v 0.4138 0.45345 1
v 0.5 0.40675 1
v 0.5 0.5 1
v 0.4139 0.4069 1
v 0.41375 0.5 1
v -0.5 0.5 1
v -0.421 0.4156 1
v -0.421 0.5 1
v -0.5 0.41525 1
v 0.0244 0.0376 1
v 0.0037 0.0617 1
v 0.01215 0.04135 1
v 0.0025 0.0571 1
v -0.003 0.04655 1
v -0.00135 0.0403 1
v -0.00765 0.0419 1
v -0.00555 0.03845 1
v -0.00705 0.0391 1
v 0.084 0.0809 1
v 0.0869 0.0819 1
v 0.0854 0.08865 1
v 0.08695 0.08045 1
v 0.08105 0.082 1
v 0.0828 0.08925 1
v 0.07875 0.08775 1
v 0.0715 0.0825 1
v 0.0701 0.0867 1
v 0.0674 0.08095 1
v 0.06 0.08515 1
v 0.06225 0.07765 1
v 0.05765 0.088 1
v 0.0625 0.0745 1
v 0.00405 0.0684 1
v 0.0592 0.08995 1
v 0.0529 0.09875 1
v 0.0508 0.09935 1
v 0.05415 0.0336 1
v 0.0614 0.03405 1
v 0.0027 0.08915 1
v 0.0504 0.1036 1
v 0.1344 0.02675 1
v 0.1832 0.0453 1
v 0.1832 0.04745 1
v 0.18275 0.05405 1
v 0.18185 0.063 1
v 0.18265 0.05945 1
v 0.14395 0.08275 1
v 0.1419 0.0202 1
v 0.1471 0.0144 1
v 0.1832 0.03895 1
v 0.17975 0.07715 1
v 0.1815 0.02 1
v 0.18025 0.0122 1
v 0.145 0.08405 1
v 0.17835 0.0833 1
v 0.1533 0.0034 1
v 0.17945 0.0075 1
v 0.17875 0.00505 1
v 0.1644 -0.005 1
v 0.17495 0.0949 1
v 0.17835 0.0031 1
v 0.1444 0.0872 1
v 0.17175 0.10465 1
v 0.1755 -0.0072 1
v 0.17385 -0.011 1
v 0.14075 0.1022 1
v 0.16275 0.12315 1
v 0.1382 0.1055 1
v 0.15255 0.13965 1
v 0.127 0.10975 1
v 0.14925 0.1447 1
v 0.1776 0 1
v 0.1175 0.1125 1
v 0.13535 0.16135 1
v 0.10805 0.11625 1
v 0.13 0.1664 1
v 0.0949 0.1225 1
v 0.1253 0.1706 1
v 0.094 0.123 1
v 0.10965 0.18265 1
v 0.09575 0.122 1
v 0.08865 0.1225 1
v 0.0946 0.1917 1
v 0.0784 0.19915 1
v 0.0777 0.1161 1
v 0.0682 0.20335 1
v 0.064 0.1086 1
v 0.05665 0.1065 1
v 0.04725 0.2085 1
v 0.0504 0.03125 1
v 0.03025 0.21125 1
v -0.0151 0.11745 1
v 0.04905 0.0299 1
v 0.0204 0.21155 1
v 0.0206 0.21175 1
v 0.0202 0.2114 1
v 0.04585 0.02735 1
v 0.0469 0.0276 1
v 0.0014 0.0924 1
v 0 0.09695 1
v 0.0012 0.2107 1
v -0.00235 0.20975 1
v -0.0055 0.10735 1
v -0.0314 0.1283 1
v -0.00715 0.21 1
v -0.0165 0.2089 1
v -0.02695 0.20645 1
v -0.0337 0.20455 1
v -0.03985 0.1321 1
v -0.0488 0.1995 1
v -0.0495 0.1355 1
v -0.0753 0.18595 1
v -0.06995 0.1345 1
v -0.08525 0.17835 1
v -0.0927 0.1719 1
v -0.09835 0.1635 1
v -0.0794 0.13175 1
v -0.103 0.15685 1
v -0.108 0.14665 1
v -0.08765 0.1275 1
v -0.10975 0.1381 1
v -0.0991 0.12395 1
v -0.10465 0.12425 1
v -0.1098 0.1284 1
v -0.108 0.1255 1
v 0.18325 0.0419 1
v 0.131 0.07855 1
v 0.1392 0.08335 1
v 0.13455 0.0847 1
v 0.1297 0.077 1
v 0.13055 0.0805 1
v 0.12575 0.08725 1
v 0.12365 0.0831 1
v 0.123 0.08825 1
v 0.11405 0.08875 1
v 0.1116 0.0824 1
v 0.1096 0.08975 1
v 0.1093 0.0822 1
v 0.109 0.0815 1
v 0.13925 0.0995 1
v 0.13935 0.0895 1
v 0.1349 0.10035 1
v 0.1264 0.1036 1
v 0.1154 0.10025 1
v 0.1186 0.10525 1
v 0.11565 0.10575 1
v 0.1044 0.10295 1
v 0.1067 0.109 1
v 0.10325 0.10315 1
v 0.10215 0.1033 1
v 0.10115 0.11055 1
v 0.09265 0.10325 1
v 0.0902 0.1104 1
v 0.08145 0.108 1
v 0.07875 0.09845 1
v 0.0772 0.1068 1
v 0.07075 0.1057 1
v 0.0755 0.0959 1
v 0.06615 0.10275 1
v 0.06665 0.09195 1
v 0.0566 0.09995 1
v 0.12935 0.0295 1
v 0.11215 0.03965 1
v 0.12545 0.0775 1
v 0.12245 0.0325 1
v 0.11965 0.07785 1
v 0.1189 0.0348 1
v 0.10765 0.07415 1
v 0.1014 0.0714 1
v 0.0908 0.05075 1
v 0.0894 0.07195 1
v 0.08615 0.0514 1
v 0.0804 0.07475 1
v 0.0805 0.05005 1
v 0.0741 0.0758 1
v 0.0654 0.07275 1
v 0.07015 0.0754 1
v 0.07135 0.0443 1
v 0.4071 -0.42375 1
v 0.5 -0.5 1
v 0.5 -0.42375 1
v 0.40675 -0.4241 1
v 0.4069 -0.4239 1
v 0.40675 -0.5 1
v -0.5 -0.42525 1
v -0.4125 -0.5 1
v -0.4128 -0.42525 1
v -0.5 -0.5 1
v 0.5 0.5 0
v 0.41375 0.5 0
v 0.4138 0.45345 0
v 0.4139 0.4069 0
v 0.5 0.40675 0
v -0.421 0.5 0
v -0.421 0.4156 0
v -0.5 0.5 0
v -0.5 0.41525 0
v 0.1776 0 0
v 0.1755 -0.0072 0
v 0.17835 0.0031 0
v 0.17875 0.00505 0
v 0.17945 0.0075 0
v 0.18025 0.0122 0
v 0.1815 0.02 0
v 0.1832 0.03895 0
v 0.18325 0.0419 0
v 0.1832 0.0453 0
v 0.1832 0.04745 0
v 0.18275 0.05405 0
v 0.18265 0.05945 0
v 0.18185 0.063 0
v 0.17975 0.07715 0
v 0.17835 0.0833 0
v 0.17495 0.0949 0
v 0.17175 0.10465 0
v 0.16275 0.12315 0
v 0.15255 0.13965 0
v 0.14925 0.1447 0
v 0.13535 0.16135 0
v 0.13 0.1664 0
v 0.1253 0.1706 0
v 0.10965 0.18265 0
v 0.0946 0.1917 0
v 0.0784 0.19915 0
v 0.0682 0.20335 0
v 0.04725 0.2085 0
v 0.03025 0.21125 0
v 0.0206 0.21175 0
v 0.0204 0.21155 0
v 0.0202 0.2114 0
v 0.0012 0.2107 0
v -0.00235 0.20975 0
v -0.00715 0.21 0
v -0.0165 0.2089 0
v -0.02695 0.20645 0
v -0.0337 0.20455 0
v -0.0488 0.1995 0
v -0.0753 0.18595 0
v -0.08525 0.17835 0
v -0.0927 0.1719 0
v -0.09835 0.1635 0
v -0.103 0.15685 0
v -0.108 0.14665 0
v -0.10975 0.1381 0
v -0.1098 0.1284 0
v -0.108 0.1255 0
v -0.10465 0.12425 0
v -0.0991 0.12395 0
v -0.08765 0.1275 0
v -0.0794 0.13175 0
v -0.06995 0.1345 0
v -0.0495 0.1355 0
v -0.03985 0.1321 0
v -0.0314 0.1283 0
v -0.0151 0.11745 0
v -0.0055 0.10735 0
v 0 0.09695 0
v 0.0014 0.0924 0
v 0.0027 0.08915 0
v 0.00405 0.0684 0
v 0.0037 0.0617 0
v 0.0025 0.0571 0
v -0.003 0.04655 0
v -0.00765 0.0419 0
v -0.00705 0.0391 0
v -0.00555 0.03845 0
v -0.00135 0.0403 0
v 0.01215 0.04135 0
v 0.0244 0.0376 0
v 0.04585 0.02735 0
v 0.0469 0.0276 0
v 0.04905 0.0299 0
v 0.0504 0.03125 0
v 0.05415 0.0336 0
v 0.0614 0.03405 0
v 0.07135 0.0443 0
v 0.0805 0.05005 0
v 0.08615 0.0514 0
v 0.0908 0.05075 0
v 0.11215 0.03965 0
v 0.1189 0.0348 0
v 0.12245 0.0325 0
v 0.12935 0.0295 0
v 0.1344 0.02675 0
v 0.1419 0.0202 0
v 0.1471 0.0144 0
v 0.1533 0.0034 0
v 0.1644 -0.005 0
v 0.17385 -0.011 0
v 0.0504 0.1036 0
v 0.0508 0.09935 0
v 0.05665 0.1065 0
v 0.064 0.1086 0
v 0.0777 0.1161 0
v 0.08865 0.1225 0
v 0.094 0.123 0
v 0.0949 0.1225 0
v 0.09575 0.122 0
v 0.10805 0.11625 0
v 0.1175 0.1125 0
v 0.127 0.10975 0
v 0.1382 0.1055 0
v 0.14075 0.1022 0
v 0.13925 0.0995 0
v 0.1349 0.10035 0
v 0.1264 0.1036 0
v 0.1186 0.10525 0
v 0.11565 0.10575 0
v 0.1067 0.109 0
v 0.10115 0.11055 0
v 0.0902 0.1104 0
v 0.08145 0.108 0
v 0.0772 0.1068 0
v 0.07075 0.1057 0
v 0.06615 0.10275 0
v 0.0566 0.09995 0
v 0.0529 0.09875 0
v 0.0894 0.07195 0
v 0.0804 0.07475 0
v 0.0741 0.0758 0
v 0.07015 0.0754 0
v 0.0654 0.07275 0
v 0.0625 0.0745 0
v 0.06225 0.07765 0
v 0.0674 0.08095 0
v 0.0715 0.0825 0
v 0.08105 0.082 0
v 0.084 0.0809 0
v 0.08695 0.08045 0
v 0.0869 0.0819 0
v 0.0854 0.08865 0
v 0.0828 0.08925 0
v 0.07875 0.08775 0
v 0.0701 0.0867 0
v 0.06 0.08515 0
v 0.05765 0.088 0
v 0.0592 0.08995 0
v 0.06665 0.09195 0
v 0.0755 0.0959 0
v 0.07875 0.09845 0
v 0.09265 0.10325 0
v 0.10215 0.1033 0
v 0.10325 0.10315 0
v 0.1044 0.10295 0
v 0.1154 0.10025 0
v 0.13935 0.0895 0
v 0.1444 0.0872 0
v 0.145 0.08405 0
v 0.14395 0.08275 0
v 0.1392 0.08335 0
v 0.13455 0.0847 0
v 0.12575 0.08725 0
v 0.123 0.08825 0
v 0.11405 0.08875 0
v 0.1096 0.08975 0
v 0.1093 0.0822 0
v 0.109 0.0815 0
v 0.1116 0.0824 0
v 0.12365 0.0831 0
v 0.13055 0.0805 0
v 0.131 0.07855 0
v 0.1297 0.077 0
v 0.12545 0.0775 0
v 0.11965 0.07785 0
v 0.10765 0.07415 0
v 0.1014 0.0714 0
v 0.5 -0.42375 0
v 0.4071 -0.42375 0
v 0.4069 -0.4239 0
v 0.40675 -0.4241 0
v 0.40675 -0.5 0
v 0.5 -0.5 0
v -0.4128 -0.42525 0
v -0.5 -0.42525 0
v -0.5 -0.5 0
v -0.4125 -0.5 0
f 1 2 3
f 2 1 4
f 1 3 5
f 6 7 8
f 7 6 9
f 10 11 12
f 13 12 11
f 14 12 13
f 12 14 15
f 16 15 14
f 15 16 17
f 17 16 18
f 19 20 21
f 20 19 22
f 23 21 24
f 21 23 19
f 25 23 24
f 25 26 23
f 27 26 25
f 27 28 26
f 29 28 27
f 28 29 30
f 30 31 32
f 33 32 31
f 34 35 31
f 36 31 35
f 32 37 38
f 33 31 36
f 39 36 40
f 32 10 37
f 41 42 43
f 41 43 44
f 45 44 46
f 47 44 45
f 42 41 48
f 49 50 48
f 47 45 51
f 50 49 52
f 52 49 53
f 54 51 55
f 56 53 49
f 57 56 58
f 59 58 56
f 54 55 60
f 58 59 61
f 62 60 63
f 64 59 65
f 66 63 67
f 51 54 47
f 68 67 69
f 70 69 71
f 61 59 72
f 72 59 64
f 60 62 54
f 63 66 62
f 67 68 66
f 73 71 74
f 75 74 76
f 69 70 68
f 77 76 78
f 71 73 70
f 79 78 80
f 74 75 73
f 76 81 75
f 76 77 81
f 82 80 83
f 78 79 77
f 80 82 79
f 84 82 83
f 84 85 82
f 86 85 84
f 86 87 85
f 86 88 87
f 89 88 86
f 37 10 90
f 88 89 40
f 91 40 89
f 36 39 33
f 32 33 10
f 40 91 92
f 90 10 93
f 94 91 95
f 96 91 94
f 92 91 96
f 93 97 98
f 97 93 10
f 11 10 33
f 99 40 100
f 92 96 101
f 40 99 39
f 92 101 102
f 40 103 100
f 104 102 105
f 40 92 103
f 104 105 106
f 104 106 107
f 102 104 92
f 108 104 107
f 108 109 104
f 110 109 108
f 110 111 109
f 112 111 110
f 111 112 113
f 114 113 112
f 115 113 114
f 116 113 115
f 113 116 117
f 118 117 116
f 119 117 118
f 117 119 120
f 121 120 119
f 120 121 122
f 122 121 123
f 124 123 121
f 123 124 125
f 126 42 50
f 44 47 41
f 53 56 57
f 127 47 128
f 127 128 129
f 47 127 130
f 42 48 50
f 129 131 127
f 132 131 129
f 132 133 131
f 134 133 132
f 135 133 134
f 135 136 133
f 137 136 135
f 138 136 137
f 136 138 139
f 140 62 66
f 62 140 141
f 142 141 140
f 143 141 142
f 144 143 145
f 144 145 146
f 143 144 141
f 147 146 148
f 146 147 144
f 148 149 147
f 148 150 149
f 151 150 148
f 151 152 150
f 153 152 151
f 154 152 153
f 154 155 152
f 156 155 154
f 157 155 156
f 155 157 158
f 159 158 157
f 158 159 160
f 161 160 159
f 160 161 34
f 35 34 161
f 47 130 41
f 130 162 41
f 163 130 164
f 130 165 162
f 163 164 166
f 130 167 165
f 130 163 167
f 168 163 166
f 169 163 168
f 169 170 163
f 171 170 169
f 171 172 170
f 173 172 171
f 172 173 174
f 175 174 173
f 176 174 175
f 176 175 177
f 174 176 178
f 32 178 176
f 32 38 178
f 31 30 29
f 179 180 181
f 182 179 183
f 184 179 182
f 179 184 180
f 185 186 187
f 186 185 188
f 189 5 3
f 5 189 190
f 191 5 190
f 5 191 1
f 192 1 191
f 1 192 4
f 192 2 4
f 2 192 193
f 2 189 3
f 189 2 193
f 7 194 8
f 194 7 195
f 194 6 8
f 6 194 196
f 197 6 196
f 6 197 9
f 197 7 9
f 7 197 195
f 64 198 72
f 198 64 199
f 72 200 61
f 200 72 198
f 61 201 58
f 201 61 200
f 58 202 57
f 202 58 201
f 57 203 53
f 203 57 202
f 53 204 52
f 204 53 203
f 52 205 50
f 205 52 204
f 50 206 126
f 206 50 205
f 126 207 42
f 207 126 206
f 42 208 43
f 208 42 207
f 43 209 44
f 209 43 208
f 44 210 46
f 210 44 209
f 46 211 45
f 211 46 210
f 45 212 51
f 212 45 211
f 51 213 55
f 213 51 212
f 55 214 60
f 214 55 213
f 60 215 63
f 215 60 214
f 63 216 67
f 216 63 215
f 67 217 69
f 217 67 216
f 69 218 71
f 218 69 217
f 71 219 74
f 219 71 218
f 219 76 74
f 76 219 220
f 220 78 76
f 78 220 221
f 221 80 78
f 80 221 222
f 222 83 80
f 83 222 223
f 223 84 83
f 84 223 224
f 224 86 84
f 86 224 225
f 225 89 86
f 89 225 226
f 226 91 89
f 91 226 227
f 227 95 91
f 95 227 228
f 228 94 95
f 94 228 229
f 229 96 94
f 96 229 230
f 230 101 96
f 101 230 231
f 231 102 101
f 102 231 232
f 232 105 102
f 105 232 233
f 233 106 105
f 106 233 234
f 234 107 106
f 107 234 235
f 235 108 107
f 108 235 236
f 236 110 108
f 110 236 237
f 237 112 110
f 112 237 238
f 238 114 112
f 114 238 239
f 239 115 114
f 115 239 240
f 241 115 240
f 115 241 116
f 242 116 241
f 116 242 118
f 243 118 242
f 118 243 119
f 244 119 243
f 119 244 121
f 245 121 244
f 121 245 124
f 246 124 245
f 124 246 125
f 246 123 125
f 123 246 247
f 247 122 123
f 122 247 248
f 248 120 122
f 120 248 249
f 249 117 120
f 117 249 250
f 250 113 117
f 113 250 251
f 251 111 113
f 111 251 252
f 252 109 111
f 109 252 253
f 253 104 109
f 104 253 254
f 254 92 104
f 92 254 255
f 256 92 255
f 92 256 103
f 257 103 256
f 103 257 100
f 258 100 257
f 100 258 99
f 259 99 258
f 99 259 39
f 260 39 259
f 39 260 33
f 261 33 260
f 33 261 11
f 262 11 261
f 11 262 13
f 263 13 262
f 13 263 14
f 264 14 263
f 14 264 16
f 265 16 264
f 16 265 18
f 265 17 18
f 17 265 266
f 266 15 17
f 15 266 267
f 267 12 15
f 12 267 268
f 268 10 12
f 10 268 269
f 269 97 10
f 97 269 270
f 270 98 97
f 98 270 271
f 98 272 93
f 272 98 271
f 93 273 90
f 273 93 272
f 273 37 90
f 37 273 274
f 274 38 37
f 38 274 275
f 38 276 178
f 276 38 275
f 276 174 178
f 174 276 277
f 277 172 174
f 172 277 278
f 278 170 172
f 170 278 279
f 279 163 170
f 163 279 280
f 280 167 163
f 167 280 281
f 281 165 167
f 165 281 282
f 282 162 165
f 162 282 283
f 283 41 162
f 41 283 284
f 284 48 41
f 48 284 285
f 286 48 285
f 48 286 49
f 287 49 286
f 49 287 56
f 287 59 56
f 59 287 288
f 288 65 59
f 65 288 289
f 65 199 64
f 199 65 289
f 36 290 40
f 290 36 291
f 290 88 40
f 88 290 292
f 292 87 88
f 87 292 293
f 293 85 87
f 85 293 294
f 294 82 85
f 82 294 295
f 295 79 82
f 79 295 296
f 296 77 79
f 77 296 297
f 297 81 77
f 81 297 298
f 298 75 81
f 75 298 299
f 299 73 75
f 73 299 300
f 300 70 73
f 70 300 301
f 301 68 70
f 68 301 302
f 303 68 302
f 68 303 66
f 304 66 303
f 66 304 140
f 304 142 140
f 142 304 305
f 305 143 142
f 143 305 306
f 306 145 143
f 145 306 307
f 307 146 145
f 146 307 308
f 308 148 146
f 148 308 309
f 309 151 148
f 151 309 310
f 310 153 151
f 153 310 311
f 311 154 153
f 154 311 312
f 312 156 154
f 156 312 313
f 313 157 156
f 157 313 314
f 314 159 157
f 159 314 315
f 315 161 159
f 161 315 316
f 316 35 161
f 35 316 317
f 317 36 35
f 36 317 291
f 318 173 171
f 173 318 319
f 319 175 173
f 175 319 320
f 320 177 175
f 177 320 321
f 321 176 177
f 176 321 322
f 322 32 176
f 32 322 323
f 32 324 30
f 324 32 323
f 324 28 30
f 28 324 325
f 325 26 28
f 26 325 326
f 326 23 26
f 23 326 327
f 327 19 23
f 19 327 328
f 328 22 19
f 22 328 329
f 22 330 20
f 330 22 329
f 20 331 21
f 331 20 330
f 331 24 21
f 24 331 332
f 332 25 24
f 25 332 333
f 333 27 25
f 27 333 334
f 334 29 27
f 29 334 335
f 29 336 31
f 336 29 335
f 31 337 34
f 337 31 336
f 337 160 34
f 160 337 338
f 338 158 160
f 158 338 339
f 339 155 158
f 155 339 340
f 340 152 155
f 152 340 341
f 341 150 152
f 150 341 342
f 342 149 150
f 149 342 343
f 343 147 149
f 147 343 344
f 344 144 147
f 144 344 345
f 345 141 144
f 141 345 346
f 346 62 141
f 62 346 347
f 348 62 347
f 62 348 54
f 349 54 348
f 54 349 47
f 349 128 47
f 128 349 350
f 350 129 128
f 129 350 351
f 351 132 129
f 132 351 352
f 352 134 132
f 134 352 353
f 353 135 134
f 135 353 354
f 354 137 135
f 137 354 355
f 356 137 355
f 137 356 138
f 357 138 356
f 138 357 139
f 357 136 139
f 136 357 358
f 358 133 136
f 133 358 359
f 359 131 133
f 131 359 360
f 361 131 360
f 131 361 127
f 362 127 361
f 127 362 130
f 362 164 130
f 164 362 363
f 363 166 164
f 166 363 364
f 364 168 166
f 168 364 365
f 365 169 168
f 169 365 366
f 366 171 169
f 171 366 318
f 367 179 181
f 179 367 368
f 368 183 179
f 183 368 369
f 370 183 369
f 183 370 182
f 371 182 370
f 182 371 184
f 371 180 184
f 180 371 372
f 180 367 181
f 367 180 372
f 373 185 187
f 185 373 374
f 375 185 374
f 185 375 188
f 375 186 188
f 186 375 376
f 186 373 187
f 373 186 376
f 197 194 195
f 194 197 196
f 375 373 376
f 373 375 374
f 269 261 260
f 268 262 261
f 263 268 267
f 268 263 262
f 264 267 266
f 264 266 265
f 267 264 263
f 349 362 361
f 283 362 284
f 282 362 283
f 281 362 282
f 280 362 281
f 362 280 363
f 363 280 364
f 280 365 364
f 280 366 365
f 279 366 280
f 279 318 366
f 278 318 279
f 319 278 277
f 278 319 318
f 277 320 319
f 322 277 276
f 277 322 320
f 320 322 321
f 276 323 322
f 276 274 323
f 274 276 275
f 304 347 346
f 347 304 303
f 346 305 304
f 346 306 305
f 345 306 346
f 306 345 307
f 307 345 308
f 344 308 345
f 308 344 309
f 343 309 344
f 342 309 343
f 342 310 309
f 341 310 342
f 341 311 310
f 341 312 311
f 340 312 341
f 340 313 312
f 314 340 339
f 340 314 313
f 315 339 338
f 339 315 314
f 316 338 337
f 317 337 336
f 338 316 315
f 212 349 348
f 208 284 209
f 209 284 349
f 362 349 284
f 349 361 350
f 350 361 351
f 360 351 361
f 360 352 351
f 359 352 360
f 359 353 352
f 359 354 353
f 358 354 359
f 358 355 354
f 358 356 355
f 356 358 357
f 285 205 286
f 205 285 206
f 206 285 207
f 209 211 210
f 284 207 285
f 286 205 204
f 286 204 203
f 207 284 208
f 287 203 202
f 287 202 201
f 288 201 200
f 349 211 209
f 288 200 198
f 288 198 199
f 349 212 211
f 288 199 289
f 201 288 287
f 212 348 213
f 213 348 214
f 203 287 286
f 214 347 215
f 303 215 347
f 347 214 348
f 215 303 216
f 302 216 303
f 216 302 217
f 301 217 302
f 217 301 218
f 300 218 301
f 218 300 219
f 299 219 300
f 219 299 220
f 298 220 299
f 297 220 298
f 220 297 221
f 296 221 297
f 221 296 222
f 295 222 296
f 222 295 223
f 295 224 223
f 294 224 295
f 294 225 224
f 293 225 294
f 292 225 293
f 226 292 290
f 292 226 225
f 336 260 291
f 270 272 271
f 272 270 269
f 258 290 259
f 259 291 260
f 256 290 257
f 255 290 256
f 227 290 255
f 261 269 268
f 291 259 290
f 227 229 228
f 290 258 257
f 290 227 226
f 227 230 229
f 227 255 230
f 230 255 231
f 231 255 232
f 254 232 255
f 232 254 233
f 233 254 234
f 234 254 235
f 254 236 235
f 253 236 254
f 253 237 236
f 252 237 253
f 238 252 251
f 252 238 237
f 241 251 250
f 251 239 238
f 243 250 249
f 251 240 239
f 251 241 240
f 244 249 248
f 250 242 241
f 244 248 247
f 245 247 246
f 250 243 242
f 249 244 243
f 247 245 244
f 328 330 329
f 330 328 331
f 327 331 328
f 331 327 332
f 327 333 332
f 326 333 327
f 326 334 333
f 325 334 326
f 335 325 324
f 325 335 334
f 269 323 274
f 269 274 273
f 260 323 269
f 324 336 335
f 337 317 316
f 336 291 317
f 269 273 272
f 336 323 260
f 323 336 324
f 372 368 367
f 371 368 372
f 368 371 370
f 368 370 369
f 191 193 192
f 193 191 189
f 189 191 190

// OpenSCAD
module ms2yellow_1()
{
 /* Generated by trace2scad version 20150415
    http://aggregate.org/MAKE/TRACE2SCAD/
    Optimized model has 190/1359 original points
 */
 color([0.5, 0.5, 0.5])
 assign(minx=0) /* polygon minx=0 */
 assign(miny=0) /* polygon miny=0 */
 assign(maxx=20000) /* polygon maxx=20000 */
 assign(maxy=20000) /* polygon maxy=20000 */
 assign(dx=maxx-minx)
 assign(dy=maxy-miny)
 assign(maxd=((dx>dy)?dx:dy))
 scale([1/maxd, 1/maxd, 1])
 translate([-minx-dx/2, -miny-dy/2, 0])
 linear_extrude(height=1, convexity=190)
 union() {
  union() {
   polygon([[0,19153],[0,18305],[1580,18312],[1580,20000],[0,20000]], convexity=5);
   polygon([[18276,19069],[18278,18138],[20000,18135],[20000,20000],[18275,20000]], convexity=5);
   union() {
    difference() {
     polygon([[10408,14231],[10404,14228],[10024,14214],[9953,14195],[9857,14200],[9670,14178],[9461,14129],[9326,14091],[9024,13990],[8494,13719],[8295,13567],[8146,13438],[8033,13270],[7940,13137],[7840,12933],[7805,12762],[7804,12568],[7840,12510],[7907,12485],[8018,12479],[8247,12550],[8412,12635],[8601,12690],[9010,12710],[9203,12642],[9372,12566],[9698,12349],[9890,12147],[10000,11939],[10028,11848],[10054,11783],[10081,11368],[10074,11234],[10050,11142],[9940,10931],[9847,10838],[9859,10782],[9889,10769],[9973,10806],[10243,10827],[10488,10752],[10917,10547],[10938,10552],[10981,10598],[11008,10625],[11083,10672],[11228,10681],[11427,10886],[11610,11001],[11723,11028],[11816,11015],[12243,10793],[12378,10696],[12449,10650],[12587,10590],[12688,10535],[12838,10404],[12942,10288],[13066,10068],[13288,9900],[13477,9780],[13510,9856],[13552,10000],[13567,10062],[13575,10101],[13589,10150],[13605,10244],[13630,10400],[13664,10779],[13665,10838],[13664,10906],[13664,10949],[13655,11081],[13653,11189],[13637,11260],[13595,11543],[13567,11666],[13499,11898],[13435,12093],[13255,12463],[13051,12793],[12985,12894],[12707,13227],[12600,13328],[12506,13412],[12193,13653],[11892,13834],[11568,13983],[11364,14067],[10945,14170],[10605,14225],[10412,14235]], convexity=18);
     polygon([[11898,12450],[11915,12440],[12161,12325],[12350,12250],[12540,12195],[12764,12110],[12815,12044],[12785,11990],[12698,12007],[12528,12072],[12372,12105],[12313,12115],[12134,12180],[12023,12211],[11804,12208],[11629,12160],[11544,12136],[11415,12114],[11323,12055],[11132,11999],[11058,11975],[11016,11987],[11008,12072],[11133,12130],[11280,12172],[11554,12322],[11773,12450],[11880,12460]], convexity=8);
     polygon([[12065,12063],[12088,12059],[12308,12005],[12787,11790],[12888,11744],[12900,11681],[12879,11655],[12784,11667],[12691,11694],[12515,11745],[12460,11765],[12281,11775],[12192,11795],[12186,11644],[12180,11630],[12232,11648],[12473,11662],[12611,11610],[12620,11571],[12594,11540],[12509,11550],[12393,11557],[12153,11483],[12028,11428],[11788,11439],[11608,11495],[11482,11516],[11403,11508],[11308,11455],[11250,11490],[11245,11553],[11348,11619],[11430,11650],[11621,11640],[11680,11618],[11739,11609],[11738,11638],[11708,11773],[11656,11785],[11575,11755],[11402,11734],[11200,11703],[11153,11760],[11184,11799],[11333,11839],[11510,11918],[11575,11969],[11853,12065],[12043,12066]], convexity=20);
    }
   }
   polygon([[18138,1522],[18135,1518],[18135,0],[20000,0],[20000,1525],[18142,1525]], convexity=6);
   polygon([[0,748],[0,0],[1750,0],[1744,1495],[0,1495]], convexity=5);
  }
 }
}

module ms2yellow()
{
 /* all layers combined, scaled to within a 1mm cube */
 scale([1, 1, 1/1])
 difference() {
  union() {
   scale([1,1,2]) translate([0,0,-0.5]) ms2yellow_1();
  }
  translate([0,0,-2]) cube([2,2,4],center=true);
 }
}
ms2yellow();
